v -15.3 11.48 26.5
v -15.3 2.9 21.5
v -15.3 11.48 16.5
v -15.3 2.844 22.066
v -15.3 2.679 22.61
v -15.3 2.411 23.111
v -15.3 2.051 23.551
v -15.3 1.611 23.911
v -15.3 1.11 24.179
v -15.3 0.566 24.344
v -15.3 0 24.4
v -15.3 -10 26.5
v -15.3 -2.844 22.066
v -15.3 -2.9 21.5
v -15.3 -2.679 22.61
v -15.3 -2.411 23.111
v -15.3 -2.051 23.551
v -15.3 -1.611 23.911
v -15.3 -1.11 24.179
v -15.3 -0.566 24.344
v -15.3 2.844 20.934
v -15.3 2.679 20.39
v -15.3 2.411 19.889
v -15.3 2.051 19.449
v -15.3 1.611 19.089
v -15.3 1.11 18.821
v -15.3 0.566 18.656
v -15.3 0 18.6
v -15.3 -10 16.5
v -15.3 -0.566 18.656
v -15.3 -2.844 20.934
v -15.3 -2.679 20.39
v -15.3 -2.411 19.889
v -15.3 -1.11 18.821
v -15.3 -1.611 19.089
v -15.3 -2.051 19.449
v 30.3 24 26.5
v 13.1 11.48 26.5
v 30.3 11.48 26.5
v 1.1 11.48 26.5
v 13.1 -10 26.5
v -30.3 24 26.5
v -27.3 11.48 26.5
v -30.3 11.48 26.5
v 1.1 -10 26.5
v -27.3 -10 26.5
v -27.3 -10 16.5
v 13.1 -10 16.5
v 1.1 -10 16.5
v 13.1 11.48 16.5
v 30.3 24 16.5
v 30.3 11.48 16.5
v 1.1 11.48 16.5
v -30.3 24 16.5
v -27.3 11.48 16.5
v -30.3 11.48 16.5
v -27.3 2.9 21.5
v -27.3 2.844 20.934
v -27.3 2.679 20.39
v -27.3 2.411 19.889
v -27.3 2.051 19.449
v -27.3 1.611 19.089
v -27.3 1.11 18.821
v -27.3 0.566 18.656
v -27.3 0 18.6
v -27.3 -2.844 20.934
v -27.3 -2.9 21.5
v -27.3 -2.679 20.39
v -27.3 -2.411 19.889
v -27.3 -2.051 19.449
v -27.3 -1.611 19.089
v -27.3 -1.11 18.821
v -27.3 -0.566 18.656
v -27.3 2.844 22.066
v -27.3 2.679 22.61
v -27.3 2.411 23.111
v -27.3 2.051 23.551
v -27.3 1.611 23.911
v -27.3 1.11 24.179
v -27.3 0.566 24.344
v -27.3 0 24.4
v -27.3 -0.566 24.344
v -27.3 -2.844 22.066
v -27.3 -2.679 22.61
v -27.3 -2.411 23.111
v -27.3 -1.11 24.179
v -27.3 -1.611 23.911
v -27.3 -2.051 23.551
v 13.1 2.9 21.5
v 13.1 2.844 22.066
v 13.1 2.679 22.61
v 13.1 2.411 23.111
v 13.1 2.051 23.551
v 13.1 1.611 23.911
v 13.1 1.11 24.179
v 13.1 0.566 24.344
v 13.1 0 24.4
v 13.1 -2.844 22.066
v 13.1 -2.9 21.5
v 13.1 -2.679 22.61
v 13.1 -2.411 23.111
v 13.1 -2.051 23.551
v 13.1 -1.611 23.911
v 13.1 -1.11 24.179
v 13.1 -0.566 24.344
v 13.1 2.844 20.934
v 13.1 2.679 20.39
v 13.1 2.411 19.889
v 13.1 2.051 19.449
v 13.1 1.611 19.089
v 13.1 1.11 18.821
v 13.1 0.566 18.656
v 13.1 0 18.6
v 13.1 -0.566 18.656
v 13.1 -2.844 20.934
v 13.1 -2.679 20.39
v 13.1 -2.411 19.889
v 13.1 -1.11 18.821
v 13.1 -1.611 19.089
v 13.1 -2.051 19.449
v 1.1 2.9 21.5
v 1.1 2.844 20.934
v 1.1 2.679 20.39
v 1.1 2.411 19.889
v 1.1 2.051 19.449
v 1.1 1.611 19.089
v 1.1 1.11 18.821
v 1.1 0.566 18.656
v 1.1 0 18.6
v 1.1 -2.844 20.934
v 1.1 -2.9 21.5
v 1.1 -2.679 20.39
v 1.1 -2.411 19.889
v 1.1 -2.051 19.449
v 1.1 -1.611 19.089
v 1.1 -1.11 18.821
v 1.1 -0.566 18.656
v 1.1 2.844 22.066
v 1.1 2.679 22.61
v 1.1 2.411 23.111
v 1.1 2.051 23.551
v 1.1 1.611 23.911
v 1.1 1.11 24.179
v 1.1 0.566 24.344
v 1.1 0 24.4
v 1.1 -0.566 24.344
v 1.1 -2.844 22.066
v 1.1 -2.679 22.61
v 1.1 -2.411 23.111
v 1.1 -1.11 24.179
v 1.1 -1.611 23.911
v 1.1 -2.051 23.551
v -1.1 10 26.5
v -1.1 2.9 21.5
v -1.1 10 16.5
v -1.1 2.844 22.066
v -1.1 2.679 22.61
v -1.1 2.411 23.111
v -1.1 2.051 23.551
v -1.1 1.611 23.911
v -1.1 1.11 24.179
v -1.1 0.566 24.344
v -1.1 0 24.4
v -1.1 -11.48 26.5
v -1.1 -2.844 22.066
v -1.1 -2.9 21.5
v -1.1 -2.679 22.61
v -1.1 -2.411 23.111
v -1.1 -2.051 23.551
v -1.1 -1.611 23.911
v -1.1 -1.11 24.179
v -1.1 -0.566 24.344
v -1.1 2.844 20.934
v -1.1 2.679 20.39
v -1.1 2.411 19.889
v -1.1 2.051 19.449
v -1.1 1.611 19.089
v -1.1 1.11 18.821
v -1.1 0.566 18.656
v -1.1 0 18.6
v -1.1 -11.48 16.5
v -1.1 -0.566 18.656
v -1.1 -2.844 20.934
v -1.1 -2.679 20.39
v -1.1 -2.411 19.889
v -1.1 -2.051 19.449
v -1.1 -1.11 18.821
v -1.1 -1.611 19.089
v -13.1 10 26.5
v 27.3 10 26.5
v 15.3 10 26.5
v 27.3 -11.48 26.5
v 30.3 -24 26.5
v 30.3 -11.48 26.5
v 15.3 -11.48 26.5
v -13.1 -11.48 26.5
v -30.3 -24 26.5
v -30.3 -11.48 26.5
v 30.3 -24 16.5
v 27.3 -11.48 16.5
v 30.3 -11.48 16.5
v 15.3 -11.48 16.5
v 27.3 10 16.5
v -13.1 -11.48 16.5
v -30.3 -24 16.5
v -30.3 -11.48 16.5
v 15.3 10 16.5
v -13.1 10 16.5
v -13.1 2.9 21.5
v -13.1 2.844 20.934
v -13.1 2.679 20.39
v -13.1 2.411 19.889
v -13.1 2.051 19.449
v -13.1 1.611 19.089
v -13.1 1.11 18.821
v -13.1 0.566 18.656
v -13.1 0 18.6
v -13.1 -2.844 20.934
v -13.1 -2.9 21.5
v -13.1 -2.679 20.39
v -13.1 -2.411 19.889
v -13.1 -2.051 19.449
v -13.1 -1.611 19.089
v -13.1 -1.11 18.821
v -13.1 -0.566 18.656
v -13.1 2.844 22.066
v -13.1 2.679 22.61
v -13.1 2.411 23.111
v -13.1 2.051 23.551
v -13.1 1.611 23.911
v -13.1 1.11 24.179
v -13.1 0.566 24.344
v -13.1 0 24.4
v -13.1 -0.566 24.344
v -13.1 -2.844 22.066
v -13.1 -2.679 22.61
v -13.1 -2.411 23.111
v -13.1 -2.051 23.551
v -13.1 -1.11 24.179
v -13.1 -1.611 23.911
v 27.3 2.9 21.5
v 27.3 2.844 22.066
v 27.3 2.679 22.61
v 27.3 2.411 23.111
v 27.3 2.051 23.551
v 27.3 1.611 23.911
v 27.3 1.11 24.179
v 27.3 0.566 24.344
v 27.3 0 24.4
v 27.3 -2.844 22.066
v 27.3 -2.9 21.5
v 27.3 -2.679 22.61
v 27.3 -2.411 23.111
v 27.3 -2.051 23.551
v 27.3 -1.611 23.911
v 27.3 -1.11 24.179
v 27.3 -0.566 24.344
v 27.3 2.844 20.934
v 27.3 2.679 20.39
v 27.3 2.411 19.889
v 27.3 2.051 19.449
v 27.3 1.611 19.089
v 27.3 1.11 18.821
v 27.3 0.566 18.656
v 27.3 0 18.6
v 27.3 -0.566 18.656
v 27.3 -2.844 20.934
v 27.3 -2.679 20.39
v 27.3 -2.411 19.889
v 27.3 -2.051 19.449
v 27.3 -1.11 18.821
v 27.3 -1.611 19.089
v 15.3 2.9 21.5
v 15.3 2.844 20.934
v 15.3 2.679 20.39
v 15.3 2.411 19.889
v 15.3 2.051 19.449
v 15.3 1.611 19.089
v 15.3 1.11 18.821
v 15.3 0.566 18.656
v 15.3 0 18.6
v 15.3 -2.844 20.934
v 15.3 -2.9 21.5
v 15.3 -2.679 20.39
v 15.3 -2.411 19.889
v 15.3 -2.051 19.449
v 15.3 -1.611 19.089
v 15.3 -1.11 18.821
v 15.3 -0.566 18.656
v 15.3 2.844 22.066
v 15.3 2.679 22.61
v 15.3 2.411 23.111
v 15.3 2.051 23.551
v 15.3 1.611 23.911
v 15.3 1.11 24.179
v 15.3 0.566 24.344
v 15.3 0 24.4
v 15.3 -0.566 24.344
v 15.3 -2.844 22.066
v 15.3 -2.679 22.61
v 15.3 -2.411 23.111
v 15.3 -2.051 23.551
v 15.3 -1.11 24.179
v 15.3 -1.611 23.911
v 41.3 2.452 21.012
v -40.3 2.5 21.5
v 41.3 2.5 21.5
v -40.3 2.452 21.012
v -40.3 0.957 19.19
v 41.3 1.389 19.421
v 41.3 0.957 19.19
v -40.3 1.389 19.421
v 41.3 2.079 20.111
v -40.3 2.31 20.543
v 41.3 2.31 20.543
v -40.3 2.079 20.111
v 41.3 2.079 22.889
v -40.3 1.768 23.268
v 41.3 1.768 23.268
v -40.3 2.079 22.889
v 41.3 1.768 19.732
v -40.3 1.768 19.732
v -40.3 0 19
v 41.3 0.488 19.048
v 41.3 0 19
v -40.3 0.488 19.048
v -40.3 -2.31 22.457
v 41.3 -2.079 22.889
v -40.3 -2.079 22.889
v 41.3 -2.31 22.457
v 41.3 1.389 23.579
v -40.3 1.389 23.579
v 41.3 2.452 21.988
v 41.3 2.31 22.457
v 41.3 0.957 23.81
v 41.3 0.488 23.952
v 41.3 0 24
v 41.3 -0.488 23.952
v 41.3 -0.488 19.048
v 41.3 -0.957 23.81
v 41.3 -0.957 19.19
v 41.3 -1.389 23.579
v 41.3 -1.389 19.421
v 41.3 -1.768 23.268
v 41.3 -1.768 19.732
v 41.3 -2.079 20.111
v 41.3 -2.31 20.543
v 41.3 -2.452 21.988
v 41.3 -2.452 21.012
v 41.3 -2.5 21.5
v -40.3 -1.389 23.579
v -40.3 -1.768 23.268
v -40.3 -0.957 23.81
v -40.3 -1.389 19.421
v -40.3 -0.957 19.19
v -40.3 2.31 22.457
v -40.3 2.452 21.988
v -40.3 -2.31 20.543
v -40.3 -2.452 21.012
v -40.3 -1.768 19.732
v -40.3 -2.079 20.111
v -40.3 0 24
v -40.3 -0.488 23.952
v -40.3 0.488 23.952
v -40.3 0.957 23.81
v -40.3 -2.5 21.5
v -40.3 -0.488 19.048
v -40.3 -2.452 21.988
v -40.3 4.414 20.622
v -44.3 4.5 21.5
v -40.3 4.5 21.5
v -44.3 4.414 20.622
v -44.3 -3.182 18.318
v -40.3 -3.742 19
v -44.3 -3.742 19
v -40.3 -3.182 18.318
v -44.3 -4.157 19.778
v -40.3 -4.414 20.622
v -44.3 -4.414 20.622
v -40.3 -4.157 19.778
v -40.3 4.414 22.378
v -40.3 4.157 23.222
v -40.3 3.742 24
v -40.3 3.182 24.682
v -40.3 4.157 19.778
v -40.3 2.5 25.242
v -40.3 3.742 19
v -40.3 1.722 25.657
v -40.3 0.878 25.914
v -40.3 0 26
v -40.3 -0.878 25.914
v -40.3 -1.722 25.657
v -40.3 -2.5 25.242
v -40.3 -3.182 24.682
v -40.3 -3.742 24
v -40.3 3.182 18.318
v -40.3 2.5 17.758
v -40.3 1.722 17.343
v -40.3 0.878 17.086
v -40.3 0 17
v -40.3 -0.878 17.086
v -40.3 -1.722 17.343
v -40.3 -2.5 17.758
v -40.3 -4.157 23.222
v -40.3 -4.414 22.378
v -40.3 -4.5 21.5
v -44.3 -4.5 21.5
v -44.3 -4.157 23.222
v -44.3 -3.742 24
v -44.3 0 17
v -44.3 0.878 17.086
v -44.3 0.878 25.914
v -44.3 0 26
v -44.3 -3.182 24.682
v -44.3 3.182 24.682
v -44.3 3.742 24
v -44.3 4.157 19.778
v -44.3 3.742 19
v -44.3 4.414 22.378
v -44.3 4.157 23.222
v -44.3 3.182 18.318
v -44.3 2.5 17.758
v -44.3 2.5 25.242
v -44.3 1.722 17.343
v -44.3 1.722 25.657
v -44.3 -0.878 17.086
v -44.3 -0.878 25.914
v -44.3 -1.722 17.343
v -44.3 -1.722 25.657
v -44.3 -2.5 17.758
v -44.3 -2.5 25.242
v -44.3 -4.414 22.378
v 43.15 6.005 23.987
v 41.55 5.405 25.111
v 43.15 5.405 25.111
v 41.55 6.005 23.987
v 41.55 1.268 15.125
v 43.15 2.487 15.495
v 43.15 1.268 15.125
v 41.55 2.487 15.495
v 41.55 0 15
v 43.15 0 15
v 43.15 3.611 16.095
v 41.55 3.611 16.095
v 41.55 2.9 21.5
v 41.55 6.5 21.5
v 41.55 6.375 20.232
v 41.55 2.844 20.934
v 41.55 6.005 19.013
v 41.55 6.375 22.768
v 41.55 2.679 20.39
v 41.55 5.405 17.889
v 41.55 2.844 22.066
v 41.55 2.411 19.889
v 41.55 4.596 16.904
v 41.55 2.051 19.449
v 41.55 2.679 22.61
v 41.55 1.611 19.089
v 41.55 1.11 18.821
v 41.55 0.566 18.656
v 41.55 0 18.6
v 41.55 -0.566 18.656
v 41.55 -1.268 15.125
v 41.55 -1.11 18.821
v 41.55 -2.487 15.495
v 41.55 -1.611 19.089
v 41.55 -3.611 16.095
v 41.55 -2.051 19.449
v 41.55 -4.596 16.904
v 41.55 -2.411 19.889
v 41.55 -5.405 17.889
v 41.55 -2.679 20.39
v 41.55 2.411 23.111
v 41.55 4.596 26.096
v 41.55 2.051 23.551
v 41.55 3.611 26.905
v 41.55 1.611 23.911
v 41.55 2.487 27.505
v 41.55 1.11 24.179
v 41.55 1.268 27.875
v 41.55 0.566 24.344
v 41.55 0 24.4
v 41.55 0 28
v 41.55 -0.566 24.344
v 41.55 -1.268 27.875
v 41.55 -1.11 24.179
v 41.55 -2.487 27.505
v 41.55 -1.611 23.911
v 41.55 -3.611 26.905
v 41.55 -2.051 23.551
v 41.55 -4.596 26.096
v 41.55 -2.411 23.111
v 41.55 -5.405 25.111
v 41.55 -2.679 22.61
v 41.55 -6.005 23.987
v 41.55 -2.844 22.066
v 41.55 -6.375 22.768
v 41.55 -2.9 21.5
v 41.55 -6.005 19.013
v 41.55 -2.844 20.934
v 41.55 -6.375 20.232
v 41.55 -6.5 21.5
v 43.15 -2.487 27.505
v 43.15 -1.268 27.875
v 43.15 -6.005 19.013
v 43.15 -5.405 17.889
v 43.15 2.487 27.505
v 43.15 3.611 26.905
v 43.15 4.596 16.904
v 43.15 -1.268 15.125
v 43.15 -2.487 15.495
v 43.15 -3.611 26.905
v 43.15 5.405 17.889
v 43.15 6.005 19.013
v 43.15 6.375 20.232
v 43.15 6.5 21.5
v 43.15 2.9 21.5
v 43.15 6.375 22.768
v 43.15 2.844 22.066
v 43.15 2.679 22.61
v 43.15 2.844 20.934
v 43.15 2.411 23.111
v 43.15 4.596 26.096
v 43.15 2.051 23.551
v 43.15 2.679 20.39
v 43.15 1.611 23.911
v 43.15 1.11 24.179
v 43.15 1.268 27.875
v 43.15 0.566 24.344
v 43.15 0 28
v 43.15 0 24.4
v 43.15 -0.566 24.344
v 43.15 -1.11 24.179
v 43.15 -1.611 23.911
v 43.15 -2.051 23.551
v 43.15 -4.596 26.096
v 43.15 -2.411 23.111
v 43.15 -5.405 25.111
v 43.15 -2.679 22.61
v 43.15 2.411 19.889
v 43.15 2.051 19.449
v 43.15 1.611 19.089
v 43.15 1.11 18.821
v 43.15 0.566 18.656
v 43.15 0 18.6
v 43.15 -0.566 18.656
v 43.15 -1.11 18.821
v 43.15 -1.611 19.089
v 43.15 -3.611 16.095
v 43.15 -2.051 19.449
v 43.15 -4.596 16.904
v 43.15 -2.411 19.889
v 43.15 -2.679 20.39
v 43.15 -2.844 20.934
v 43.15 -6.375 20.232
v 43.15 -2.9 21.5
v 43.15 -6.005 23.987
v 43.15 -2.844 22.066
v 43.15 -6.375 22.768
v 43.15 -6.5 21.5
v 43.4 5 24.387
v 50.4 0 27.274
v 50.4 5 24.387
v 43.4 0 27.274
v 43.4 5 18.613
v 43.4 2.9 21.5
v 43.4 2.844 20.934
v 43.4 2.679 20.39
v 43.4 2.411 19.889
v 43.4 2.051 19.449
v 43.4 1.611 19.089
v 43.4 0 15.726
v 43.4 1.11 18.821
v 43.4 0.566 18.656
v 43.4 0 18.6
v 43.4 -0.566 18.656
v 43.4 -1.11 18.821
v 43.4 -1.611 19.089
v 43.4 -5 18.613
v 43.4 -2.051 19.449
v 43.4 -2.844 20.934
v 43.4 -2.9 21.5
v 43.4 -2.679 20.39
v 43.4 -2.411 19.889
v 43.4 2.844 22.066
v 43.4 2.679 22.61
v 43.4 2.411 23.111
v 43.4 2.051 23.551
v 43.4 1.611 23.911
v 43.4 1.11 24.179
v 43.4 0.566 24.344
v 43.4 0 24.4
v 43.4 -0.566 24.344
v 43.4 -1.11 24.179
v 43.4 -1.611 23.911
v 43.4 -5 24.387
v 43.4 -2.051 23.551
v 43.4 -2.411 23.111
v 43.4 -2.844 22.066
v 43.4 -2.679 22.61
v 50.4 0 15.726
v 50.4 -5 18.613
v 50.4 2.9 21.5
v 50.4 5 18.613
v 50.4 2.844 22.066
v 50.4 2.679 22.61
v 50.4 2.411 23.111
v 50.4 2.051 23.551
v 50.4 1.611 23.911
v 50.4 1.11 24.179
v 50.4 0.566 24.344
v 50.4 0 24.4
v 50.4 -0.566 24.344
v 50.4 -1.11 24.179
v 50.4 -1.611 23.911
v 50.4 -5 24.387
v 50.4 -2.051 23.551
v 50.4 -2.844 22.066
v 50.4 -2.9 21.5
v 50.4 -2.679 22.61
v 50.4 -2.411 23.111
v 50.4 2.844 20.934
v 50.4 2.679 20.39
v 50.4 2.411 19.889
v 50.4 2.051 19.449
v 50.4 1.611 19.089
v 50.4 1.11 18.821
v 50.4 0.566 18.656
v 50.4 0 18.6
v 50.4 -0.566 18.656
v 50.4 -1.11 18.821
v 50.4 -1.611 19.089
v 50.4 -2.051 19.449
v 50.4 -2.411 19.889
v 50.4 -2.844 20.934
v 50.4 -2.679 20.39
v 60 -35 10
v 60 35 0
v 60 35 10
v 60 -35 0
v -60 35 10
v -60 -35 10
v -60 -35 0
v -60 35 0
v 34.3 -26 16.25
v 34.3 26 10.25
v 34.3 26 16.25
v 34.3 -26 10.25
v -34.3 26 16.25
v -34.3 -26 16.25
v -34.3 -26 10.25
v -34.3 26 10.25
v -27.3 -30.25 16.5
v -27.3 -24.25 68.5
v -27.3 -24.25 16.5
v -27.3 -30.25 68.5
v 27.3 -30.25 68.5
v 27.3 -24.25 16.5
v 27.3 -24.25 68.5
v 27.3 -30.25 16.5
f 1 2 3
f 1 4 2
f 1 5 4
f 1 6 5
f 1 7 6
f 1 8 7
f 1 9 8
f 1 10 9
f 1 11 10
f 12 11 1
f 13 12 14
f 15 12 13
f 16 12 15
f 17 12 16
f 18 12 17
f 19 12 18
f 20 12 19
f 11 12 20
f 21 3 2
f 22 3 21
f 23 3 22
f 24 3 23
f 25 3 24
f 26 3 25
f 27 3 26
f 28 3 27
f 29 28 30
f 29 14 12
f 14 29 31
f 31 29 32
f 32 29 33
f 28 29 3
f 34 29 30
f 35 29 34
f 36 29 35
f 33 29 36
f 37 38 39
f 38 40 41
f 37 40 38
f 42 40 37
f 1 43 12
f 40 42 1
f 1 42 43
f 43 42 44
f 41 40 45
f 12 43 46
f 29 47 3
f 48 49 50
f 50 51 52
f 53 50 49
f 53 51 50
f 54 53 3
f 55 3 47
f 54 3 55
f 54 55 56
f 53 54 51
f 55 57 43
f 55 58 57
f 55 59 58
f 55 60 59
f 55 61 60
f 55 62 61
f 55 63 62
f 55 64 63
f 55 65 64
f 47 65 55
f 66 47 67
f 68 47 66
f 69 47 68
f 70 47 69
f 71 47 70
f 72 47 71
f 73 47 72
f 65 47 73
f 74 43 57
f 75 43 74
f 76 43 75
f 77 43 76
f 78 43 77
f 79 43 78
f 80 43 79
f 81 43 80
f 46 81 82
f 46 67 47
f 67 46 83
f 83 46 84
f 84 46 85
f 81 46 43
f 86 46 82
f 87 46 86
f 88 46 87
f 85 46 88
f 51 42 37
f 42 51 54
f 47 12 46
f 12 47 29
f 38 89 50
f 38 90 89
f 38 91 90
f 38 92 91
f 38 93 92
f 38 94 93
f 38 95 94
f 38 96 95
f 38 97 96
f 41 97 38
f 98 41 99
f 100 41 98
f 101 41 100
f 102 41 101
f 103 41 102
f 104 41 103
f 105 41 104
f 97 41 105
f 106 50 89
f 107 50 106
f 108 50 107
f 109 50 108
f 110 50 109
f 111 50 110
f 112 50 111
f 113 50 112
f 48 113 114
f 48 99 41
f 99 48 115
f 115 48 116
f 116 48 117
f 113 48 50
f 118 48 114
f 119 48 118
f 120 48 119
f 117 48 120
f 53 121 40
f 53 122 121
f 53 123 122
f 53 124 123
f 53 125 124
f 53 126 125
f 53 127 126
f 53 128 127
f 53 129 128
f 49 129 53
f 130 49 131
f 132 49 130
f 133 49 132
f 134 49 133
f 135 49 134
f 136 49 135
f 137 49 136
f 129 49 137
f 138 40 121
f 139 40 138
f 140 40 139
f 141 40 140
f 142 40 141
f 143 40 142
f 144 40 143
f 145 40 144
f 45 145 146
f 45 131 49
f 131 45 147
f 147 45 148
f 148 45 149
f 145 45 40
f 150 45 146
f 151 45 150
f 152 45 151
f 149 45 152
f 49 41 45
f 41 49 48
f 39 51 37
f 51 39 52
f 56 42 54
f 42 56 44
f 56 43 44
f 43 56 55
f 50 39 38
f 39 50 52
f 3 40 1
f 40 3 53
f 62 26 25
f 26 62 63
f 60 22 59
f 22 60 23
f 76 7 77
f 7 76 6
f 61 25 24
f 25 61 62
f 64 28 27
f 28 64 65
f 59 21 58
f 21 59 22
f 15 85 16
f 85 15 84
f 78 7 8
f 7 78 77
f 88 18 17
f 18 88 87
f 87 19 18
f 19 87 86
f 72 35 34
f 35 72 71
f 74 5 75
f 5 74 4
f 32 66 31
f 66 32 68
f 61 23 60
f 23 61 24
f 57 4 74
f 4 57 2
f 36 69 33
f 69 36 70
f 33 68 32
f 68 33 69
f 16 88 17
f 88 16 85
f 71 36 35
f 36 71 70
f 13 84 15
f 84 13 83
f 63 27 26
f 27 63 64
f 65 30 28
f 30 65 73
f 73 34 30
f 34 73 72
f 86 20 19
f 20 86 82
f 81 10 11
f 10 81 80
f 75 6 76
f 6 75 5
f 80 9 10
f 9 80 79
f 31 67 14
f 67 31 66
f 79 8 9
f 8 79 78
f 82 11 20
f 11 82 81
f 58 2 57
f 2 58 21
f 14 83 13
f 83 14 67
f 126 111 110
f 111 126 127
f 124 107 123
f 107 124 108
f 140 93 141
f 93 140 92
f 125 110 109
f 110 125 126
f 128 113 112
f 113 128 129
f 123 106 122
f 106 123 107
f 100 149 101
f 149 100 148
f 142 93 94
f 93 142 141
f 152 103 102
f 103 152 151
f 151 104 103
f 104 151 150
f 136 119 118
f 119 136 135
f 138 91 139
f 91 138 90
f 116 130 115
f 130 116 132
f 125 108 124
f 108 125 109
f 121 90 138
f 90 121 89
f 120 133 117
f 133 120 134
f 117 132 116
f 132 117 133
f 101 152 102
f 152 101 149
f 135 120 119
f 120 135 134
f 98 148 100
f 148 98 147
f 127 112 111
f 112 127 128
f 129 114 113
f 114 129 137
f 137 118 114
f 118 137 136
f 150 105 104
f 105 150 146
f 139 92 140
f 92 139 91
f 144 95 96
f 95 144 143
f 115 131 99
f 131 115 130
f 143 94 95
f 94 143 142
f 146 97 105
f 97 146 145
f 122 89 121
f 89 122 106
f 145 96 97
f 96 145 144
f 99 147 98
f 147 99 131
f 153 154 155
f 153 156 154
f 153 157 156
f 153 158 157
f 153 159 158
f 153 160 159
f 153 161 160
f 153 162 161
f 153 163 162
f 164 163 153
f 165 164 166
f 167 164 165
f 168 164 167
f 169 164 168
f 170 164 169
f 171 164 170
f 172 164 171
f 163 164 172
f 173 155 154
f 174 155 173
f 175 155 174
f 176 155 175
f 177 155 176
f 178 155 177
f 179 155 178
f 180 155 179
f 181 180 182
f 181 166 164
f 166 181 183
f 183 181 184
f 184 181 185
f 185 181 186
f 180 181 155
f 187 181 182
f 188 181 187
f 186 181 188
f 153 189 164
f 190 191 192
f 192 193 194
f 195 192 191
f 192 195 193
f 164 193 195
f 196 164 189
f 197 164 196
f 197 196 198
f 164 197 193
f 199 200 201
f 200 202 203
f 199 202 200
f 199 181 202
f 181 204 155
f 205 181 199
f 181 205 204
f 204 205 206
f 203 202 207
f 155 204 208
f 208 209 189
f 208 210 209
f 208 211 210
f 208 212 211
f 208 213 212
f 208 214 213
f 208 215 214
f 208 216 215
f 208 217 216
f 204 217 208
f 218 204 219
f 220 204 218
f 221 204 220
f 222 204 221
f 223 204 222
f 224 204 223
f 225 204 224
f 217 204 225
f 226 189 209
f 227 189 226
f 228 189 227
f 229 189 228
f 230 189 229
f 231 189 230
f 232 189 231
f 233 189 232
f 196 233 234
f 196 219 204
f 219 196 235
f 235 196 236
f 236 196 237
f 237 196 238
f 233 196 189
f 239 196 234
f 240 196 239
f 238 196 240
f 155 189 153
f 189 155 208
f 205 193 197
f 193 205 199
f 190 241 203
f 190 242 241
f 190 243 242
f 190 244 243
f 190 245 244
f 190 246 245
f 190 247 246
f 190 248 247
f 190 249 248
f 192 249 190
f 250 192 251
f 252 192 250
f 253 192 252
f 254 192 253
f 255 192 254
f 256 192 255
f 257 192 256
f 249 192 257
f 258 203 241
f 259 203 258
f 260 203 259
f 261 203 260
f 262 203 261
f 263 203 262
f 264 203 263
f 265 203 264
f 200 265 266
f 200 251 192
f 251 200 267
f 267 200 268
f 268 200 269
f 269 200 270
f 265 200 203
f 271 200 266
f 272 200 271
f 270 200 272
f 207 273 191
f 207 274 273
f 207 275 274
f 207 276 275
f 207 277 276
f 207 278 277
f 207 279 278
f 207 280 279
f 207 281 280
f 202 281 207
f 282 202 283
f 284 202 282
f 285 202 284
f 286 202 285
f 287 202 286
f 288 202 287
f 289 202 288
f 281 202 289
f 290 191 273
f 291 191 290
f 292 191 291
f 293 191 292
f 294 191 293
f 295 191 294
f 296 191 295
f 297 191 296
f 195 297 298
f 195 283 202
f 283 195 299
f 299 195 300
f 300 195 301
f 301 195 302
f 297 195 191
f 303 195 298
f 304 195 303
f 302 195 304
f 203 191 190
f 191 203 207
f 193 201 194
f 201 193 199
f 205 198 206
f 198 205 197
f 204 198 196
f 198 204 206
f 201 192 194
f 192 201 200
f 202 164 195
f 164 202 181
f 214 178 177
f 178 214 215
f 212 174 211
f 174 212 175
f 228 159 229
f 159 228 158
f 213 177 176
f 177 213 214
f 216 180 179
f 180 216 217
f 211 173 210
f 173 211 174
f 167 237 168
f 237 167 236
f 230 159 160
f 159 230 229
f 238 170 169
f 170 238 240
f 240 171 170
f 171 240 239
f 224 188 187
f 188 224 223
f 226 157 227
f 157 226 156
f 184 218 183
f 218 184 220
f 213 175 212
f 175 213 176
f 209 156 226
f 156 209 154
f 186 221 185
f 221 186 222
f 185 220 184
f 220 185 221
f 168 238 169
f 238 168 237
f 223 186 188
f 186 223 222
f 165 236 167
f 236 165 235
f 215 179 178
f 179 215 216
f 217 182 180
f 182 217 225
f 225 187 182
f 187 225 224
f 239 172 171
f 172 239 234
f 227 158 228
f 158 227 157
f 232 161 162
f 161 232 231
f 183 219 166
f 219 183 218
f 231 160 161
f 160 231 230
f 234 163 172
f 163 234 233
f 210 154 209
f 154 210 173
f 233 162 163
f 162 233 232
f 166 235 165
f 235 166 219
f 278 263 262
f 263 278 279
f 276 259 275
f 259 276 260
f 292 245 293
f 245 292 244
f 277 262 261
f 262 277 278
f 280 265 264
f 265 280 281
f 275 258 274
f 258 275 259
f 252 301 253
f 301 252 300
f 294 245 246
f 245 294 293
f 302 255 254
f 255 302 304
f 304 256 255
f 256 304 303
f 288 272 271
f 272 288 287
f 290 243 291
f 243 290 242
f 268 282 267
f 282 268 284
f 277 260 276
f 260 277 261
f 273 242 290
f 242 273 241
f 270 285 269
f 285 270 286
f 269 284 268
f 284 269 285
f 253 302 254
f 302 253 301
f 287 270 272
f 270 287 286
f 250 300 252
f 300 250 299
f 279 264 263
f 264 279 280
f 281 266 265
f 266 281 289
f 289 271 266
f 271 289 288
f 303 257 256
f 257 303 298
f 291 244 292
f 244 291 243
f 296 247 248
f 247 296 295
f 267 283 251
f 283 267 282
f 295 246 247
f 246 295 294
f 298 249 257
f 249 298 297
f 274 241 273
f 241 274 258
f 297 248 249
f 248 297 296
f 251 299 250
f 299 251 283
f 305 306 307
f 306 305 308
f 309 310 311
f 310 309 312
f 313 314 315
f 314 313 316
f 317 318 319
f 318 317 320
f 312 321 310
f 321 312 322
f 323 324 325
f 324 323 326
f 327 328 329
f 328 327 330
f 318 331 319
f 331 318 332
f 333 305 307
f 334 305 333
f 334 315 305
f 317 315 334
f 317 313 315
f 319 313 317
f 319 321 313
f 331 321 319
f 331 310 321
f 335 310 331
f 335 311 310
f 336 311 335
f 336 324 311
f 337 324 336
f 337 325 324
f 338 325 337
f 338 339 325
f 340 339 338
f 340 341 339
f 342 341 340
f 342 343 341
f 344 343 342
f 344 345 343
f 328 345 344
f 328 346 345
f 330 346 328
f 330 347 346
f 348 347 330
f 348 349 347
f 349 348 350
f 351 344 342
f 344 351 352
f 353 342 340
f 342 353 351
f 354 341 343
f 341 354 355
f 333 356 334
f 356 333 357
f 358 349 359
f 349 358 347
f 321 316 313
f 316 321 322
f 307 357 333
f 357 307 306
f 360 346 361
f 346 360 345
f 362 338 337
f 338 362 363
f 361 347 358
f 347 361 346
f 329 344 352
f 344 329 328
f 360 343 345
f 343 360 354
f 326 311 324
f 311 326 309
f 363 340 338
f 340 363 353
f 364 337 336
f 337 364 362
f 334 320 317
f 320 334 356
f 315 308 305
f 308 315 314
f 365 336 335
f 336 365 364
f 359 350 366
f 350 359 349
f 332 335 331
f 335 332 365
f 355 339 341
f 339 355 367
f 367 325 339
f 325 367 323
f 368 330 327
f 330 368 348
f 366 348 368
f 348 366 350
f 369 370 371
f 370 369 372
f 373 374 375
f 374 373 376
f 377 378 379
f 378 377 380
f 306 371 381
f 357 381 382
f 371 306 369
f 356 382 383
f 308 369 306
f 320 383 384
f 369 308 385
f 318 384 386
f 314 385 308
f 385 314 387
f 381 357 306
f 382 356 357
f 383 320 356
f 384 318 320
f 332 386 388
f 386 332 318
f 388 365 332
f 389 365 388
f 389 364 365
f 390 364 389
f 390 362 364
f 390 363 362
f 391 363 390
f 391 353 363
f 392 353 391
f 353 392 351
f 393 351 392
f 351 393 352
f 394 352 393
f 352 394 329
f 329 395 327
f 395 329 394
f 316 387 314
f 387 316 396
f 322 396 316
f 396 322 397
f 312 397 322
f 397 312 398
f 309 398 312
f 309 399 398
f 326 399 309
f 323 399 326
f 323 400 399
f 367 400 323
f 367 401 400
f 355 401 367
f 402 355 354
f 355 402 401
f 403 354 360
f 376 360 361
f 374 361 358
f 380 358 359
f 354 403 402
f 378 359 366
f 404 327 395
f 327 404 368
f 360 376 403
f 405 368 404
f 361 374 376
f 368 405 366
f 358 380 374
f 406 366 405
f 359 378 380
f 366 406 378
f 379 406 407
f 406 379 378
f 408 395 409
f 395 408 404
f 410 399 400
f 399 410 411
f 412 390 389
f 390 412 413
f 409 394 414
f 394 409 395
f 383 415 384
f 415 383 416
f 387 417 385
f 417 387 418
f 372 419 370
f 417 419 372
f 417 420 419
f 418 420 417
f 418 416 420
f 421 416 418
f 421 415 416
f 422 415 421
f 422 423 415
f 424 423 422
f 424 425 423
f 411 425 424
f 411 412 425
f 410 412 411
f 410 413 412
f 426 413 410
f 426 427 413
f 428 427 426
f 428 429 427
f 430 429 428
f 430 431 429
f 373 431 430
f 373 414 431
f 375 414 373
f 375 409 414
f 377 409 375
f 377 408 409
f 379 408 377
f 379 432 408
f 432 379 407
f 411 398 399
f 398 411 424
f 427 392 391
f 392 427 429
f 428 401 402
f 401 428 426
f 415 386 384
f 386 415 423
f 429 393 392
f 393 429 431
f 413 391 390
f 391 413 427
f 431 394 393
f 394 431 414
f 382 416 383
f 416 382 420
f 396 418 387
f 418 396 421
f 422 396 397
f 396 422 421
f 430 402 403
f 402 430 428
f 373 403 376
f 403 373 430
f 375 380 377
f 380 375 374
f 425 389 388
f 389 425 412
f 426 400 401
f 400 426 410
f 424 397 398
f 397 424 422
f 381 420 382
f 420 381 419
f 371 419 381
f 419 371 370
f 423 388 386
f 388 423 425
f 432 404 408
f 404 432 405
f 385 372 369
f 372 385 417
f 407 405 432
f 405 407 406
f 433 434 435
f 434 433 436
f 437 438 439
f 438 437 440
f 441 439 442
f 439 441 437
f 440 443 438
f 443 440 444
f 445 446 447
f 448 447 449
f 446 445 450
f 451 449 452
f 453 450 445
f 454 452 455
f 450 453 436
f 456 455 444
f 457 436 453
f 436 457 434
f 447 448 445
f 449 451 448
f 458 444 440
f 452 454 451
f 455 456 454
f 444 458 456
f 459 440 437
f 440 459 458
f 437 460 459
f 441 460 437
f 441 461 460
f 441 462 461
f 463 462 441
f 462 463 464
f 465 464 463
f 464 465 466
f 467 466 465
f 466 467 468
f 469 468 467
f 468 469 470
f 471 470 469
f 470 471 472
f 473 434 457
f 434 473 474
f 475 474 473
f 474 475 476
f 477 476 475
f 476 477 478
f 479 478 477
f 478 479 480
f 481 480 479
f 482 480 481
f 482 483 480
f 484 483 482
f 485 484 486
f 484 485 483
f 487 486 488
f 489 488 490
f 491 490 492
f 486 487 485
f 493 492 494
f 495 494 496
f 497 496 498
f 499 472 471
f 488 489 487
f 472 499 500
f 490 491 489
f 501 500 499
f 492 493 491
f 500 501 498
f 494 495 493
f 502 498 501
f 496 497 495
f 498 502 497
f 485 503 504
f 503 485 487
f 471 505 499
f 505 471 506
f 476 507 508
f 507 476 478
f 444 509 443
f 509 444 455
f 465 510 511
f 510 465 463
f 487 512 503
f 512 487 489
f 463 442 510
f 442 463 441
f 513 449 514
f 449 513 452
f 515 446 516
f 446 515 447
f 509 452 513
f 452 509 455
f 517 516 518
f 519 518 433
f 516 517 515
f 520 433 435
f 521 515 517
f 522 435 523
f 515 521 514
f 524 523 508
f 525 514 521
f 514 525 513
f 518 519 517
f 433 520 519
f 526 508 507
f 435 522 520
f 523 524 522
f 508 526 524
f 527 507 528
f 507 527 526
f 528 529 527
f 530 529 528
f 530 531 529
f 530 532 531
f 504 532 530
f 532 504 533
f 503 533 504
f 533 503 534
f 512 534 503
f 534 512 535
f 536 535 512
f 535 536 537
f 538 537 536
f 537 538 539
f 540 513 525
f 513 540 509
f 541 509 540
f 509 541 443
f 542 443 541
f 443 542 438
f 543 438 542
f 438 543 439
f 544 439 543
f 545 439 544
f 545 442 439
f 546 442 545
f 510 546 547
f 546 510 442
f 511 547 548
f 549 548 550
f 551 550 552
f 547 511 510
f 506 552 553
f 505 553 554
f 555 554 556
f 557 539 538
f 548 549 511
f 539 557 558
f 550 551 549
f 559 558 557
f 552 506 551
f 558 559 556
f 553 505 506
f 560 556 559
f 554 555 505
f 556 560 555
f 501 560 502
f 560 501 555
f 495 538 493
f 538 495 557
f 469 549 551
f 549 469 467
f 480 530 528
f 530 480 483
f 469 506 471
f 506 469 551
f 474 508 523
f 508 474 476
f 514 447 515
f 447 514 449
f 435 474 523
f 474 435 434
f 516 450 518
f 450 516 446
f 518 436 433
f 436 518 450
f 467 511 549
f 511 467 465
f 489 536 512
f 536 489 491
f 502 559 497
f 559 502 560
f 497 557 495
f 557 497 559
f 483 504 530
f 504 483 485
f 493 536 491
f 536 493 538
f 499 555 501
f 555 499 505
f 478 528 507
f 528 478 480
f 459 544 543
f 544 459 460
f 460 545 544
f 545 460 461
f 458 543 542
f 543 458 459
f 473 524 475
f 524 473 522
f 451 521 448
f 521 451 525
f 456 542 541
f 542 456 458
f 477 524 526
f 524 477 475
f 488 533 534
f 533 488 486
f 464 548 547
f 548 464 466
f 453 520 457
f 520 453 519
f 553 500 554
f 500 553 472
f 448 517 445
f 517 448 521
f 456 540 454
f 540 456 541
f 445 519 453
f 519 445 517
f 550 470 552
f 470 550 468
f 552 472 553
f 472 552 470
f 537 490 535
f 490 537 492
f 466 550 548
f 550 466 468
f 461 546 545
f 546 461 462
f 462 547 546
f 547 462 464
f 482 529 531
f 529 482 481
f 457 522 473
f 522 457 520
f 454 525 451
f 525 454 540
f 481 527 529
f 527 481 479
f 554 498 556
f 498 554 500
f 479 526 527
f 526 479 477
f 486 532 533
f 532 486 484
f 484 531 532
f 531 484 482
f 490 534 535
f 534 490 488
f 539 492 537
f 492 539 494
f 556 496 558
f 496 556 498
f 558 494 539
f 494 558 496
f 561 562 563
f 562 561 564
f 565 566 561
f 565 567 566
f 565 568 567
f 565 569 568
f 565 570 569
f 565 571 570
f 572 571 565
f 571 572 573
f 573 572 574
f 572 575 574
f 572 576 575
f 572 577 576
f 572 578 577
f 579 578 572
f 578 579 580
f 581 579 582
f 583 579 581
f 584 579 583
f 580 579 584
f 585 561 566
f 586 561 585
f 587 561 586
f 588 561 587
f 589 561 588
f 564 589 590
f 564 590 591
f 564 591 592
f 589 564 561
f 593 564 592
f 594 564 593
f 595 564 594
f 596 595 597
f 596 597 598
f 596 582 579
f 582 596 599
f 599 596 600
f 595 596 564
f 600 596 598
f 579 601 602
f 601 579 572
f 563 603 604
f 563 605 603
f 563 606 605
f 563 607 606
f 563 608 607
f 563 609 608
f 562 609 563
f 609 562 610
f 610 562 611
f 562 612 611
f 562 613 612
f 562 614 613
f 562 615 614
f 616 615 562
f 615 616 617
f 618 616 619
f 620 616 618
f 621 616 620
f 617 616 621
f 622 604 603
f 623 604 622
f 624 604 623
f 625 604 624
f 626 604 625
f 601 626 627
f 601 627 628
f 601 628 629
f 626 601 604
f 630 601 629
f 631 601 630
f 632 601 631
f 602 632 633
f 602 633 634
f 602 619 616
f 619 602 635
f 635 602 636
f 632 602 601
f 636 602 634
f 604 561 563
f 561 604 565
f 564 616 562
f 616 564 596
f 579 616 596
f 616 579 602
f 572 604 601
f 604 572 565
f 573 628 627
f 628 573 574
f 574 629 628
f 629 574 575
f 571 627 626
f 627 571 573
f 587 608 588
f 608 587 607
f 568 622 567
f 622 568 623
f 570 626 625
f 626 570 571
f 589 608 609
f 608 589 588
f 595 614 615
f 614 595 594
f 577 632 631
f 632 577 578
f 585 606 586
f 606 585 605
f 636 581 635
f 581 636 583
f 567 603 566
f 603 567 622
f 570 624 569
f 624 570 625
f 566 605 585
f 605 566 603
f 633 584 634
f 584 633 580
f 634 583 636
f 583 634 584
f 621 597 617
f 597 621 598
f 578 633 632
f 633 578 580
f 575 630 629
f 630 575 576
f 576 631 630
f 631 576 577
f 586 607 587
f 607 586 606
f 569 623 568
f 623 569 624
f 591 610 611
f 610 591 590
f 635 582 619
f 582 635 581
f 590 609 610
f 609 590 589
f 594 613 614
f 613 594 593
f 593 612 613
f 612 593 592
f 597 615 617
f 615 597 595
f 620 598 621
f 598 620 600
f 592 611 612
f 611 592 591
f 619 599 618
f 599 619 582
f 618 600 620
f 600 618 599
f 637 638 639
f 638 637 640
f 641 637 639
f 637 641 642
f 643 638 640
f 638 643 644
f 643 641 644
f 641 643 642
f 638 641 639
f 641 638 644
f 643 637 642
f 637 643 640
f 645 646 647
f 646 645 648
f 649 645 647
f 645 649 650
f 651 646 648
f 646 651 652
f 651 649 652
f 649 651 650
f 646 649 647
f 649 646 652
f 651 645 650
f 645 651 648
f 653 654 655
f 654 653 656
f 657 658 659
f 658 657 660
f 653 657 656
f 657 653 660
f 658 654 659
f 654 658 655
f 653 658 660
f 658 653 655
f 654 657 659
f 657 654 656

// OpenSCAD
$fn = 32;

// ------------------------------------------------------------------------
// Comb hinge with flap: leaf 60.6 x 24 mm, pin d5, flap 52 mm
// Every part is its own module, assembly() places every instance.
// ------------------------------------------------------------------------

// --- part 1 ---
module hinge_bed() {
  difference() {
    translate([-60, -35, 0]) cube([120, 70, 10]);
  }
}

// --- part 2 ---
module hinge_riser() {
  difference() {
    translate([-34.3, -26, 0]) cube([68.6, 52, 6]);
  }
}

// --- part 3 ---
module hinge_leaf_a() {
  difference() {
    union() {
      translate([-27.3, -10, -5]) cube([12, 34, 10]);
      translate([1.1, -10, -5]) cube([12, 34, 10]);
      translate([-30.3, 11.48, -5]) cube([60.6, 12.52, 10]);
    }
    translate([-21.3, 0, 0]) rotate([0, 90, 0]) cylinder(h = 14, d = 5.8, center = true);
    translate([7.1, 0, 0]) rotate([0, 90, 0]) cylinder(h = 14, d = 5.8, center = true);
  }
}

// --- part 4 ---
module hinge_leaf_b() {
  difference() {
    union() {
      translate([-13.1, -24, -5]) cube([12, 34, 10]);
      translate([15.3, -24, -5]) cube([12, 34, 10]);
      translate([-30.3, -24, -5]) cube([60.6, 12.52, 10]);
    }
    translate([-7.1, 0, 0]) rotate([0, 90, 0]) cylinder(h = 14, d = 5.8, center = true);
    translate([21.3, 0, 0]) rotate([0, 90, 0]) cylinder(h = 14, d = 5.8, center = true);
  }
}

// --- part 5 ---
module hinge_flap() {
  difference() {
    translate([-27.3, -26, 0]) cube([54.6, 52, 6]);
  }
}

// --- part 6 ---
module hinge_pin() {
  rotate([0, 90, 0]) cylinder(h = 82.6, d = 5, center = true);
  translate([-44.3, 0, 0]) rotate([0, 90, 0]) cylinder(h = 4, d = 9);
}

// --- part 7 ---
module pin_washer() {
  difference() {
      translate([0, 0, 0]) cylinder(h = 1.6, d = 13);
      translate([0, 0, -1]) cylinder(h = 3.6, d = 5.8);
    }
}

// --- part 8 ---
module pin_nut() {
  difference() {
    linear_extrude(height = 7) polygon(points = [[5.774, 0], [2.887, 5], [-2.887, 5], [-5.774, 0], [-2.887, -5], [2.887, -5]]);
    translate([0, 0, -1]) cylinder(h = 9, d = 5.8);
  }
}

// --- assembly ---
module assembly() {
  color([0.80, 0.24, 0.20]) translate([0, 0, 0]) rotate([0, 0, 0]) hinge_bed();
  color([0.20, 0.45, 0.75]) translate([0, 0, 10.25]) rotate([0, 0, 0]) hinge_riser();
  color([0.25, 0.62, 0.32]) translate([0, 0, 21.5]) rotate([0, 0, 0]) hinge_leaf_a();
  color([0.92, 0.70, 0.18]) translate([0, 0, 21.5]) rotate([0, 0, 0]) hinge_leaf_b();
  color([0.58, 0.35, 0.70]) translate([0, -24.25, 42.5]) rotate([90, 0, 0]) hinge_flap();
  color([0.16, 0.66, 0.66]) translate([0, 0, 21.5]) rotate([0, 0, 0]) hinge_pin();
  color([0.85, 0.48, 0.18]) translate([41.55, 0, 21.5]) rotate([0, 90, 0]) pin_washer();
  color([0.55, 0.60, 0.65]) translate([43.4, 0, 21.5]) rotate([0, 90, 0]) pin_nut();
}

assembly();
